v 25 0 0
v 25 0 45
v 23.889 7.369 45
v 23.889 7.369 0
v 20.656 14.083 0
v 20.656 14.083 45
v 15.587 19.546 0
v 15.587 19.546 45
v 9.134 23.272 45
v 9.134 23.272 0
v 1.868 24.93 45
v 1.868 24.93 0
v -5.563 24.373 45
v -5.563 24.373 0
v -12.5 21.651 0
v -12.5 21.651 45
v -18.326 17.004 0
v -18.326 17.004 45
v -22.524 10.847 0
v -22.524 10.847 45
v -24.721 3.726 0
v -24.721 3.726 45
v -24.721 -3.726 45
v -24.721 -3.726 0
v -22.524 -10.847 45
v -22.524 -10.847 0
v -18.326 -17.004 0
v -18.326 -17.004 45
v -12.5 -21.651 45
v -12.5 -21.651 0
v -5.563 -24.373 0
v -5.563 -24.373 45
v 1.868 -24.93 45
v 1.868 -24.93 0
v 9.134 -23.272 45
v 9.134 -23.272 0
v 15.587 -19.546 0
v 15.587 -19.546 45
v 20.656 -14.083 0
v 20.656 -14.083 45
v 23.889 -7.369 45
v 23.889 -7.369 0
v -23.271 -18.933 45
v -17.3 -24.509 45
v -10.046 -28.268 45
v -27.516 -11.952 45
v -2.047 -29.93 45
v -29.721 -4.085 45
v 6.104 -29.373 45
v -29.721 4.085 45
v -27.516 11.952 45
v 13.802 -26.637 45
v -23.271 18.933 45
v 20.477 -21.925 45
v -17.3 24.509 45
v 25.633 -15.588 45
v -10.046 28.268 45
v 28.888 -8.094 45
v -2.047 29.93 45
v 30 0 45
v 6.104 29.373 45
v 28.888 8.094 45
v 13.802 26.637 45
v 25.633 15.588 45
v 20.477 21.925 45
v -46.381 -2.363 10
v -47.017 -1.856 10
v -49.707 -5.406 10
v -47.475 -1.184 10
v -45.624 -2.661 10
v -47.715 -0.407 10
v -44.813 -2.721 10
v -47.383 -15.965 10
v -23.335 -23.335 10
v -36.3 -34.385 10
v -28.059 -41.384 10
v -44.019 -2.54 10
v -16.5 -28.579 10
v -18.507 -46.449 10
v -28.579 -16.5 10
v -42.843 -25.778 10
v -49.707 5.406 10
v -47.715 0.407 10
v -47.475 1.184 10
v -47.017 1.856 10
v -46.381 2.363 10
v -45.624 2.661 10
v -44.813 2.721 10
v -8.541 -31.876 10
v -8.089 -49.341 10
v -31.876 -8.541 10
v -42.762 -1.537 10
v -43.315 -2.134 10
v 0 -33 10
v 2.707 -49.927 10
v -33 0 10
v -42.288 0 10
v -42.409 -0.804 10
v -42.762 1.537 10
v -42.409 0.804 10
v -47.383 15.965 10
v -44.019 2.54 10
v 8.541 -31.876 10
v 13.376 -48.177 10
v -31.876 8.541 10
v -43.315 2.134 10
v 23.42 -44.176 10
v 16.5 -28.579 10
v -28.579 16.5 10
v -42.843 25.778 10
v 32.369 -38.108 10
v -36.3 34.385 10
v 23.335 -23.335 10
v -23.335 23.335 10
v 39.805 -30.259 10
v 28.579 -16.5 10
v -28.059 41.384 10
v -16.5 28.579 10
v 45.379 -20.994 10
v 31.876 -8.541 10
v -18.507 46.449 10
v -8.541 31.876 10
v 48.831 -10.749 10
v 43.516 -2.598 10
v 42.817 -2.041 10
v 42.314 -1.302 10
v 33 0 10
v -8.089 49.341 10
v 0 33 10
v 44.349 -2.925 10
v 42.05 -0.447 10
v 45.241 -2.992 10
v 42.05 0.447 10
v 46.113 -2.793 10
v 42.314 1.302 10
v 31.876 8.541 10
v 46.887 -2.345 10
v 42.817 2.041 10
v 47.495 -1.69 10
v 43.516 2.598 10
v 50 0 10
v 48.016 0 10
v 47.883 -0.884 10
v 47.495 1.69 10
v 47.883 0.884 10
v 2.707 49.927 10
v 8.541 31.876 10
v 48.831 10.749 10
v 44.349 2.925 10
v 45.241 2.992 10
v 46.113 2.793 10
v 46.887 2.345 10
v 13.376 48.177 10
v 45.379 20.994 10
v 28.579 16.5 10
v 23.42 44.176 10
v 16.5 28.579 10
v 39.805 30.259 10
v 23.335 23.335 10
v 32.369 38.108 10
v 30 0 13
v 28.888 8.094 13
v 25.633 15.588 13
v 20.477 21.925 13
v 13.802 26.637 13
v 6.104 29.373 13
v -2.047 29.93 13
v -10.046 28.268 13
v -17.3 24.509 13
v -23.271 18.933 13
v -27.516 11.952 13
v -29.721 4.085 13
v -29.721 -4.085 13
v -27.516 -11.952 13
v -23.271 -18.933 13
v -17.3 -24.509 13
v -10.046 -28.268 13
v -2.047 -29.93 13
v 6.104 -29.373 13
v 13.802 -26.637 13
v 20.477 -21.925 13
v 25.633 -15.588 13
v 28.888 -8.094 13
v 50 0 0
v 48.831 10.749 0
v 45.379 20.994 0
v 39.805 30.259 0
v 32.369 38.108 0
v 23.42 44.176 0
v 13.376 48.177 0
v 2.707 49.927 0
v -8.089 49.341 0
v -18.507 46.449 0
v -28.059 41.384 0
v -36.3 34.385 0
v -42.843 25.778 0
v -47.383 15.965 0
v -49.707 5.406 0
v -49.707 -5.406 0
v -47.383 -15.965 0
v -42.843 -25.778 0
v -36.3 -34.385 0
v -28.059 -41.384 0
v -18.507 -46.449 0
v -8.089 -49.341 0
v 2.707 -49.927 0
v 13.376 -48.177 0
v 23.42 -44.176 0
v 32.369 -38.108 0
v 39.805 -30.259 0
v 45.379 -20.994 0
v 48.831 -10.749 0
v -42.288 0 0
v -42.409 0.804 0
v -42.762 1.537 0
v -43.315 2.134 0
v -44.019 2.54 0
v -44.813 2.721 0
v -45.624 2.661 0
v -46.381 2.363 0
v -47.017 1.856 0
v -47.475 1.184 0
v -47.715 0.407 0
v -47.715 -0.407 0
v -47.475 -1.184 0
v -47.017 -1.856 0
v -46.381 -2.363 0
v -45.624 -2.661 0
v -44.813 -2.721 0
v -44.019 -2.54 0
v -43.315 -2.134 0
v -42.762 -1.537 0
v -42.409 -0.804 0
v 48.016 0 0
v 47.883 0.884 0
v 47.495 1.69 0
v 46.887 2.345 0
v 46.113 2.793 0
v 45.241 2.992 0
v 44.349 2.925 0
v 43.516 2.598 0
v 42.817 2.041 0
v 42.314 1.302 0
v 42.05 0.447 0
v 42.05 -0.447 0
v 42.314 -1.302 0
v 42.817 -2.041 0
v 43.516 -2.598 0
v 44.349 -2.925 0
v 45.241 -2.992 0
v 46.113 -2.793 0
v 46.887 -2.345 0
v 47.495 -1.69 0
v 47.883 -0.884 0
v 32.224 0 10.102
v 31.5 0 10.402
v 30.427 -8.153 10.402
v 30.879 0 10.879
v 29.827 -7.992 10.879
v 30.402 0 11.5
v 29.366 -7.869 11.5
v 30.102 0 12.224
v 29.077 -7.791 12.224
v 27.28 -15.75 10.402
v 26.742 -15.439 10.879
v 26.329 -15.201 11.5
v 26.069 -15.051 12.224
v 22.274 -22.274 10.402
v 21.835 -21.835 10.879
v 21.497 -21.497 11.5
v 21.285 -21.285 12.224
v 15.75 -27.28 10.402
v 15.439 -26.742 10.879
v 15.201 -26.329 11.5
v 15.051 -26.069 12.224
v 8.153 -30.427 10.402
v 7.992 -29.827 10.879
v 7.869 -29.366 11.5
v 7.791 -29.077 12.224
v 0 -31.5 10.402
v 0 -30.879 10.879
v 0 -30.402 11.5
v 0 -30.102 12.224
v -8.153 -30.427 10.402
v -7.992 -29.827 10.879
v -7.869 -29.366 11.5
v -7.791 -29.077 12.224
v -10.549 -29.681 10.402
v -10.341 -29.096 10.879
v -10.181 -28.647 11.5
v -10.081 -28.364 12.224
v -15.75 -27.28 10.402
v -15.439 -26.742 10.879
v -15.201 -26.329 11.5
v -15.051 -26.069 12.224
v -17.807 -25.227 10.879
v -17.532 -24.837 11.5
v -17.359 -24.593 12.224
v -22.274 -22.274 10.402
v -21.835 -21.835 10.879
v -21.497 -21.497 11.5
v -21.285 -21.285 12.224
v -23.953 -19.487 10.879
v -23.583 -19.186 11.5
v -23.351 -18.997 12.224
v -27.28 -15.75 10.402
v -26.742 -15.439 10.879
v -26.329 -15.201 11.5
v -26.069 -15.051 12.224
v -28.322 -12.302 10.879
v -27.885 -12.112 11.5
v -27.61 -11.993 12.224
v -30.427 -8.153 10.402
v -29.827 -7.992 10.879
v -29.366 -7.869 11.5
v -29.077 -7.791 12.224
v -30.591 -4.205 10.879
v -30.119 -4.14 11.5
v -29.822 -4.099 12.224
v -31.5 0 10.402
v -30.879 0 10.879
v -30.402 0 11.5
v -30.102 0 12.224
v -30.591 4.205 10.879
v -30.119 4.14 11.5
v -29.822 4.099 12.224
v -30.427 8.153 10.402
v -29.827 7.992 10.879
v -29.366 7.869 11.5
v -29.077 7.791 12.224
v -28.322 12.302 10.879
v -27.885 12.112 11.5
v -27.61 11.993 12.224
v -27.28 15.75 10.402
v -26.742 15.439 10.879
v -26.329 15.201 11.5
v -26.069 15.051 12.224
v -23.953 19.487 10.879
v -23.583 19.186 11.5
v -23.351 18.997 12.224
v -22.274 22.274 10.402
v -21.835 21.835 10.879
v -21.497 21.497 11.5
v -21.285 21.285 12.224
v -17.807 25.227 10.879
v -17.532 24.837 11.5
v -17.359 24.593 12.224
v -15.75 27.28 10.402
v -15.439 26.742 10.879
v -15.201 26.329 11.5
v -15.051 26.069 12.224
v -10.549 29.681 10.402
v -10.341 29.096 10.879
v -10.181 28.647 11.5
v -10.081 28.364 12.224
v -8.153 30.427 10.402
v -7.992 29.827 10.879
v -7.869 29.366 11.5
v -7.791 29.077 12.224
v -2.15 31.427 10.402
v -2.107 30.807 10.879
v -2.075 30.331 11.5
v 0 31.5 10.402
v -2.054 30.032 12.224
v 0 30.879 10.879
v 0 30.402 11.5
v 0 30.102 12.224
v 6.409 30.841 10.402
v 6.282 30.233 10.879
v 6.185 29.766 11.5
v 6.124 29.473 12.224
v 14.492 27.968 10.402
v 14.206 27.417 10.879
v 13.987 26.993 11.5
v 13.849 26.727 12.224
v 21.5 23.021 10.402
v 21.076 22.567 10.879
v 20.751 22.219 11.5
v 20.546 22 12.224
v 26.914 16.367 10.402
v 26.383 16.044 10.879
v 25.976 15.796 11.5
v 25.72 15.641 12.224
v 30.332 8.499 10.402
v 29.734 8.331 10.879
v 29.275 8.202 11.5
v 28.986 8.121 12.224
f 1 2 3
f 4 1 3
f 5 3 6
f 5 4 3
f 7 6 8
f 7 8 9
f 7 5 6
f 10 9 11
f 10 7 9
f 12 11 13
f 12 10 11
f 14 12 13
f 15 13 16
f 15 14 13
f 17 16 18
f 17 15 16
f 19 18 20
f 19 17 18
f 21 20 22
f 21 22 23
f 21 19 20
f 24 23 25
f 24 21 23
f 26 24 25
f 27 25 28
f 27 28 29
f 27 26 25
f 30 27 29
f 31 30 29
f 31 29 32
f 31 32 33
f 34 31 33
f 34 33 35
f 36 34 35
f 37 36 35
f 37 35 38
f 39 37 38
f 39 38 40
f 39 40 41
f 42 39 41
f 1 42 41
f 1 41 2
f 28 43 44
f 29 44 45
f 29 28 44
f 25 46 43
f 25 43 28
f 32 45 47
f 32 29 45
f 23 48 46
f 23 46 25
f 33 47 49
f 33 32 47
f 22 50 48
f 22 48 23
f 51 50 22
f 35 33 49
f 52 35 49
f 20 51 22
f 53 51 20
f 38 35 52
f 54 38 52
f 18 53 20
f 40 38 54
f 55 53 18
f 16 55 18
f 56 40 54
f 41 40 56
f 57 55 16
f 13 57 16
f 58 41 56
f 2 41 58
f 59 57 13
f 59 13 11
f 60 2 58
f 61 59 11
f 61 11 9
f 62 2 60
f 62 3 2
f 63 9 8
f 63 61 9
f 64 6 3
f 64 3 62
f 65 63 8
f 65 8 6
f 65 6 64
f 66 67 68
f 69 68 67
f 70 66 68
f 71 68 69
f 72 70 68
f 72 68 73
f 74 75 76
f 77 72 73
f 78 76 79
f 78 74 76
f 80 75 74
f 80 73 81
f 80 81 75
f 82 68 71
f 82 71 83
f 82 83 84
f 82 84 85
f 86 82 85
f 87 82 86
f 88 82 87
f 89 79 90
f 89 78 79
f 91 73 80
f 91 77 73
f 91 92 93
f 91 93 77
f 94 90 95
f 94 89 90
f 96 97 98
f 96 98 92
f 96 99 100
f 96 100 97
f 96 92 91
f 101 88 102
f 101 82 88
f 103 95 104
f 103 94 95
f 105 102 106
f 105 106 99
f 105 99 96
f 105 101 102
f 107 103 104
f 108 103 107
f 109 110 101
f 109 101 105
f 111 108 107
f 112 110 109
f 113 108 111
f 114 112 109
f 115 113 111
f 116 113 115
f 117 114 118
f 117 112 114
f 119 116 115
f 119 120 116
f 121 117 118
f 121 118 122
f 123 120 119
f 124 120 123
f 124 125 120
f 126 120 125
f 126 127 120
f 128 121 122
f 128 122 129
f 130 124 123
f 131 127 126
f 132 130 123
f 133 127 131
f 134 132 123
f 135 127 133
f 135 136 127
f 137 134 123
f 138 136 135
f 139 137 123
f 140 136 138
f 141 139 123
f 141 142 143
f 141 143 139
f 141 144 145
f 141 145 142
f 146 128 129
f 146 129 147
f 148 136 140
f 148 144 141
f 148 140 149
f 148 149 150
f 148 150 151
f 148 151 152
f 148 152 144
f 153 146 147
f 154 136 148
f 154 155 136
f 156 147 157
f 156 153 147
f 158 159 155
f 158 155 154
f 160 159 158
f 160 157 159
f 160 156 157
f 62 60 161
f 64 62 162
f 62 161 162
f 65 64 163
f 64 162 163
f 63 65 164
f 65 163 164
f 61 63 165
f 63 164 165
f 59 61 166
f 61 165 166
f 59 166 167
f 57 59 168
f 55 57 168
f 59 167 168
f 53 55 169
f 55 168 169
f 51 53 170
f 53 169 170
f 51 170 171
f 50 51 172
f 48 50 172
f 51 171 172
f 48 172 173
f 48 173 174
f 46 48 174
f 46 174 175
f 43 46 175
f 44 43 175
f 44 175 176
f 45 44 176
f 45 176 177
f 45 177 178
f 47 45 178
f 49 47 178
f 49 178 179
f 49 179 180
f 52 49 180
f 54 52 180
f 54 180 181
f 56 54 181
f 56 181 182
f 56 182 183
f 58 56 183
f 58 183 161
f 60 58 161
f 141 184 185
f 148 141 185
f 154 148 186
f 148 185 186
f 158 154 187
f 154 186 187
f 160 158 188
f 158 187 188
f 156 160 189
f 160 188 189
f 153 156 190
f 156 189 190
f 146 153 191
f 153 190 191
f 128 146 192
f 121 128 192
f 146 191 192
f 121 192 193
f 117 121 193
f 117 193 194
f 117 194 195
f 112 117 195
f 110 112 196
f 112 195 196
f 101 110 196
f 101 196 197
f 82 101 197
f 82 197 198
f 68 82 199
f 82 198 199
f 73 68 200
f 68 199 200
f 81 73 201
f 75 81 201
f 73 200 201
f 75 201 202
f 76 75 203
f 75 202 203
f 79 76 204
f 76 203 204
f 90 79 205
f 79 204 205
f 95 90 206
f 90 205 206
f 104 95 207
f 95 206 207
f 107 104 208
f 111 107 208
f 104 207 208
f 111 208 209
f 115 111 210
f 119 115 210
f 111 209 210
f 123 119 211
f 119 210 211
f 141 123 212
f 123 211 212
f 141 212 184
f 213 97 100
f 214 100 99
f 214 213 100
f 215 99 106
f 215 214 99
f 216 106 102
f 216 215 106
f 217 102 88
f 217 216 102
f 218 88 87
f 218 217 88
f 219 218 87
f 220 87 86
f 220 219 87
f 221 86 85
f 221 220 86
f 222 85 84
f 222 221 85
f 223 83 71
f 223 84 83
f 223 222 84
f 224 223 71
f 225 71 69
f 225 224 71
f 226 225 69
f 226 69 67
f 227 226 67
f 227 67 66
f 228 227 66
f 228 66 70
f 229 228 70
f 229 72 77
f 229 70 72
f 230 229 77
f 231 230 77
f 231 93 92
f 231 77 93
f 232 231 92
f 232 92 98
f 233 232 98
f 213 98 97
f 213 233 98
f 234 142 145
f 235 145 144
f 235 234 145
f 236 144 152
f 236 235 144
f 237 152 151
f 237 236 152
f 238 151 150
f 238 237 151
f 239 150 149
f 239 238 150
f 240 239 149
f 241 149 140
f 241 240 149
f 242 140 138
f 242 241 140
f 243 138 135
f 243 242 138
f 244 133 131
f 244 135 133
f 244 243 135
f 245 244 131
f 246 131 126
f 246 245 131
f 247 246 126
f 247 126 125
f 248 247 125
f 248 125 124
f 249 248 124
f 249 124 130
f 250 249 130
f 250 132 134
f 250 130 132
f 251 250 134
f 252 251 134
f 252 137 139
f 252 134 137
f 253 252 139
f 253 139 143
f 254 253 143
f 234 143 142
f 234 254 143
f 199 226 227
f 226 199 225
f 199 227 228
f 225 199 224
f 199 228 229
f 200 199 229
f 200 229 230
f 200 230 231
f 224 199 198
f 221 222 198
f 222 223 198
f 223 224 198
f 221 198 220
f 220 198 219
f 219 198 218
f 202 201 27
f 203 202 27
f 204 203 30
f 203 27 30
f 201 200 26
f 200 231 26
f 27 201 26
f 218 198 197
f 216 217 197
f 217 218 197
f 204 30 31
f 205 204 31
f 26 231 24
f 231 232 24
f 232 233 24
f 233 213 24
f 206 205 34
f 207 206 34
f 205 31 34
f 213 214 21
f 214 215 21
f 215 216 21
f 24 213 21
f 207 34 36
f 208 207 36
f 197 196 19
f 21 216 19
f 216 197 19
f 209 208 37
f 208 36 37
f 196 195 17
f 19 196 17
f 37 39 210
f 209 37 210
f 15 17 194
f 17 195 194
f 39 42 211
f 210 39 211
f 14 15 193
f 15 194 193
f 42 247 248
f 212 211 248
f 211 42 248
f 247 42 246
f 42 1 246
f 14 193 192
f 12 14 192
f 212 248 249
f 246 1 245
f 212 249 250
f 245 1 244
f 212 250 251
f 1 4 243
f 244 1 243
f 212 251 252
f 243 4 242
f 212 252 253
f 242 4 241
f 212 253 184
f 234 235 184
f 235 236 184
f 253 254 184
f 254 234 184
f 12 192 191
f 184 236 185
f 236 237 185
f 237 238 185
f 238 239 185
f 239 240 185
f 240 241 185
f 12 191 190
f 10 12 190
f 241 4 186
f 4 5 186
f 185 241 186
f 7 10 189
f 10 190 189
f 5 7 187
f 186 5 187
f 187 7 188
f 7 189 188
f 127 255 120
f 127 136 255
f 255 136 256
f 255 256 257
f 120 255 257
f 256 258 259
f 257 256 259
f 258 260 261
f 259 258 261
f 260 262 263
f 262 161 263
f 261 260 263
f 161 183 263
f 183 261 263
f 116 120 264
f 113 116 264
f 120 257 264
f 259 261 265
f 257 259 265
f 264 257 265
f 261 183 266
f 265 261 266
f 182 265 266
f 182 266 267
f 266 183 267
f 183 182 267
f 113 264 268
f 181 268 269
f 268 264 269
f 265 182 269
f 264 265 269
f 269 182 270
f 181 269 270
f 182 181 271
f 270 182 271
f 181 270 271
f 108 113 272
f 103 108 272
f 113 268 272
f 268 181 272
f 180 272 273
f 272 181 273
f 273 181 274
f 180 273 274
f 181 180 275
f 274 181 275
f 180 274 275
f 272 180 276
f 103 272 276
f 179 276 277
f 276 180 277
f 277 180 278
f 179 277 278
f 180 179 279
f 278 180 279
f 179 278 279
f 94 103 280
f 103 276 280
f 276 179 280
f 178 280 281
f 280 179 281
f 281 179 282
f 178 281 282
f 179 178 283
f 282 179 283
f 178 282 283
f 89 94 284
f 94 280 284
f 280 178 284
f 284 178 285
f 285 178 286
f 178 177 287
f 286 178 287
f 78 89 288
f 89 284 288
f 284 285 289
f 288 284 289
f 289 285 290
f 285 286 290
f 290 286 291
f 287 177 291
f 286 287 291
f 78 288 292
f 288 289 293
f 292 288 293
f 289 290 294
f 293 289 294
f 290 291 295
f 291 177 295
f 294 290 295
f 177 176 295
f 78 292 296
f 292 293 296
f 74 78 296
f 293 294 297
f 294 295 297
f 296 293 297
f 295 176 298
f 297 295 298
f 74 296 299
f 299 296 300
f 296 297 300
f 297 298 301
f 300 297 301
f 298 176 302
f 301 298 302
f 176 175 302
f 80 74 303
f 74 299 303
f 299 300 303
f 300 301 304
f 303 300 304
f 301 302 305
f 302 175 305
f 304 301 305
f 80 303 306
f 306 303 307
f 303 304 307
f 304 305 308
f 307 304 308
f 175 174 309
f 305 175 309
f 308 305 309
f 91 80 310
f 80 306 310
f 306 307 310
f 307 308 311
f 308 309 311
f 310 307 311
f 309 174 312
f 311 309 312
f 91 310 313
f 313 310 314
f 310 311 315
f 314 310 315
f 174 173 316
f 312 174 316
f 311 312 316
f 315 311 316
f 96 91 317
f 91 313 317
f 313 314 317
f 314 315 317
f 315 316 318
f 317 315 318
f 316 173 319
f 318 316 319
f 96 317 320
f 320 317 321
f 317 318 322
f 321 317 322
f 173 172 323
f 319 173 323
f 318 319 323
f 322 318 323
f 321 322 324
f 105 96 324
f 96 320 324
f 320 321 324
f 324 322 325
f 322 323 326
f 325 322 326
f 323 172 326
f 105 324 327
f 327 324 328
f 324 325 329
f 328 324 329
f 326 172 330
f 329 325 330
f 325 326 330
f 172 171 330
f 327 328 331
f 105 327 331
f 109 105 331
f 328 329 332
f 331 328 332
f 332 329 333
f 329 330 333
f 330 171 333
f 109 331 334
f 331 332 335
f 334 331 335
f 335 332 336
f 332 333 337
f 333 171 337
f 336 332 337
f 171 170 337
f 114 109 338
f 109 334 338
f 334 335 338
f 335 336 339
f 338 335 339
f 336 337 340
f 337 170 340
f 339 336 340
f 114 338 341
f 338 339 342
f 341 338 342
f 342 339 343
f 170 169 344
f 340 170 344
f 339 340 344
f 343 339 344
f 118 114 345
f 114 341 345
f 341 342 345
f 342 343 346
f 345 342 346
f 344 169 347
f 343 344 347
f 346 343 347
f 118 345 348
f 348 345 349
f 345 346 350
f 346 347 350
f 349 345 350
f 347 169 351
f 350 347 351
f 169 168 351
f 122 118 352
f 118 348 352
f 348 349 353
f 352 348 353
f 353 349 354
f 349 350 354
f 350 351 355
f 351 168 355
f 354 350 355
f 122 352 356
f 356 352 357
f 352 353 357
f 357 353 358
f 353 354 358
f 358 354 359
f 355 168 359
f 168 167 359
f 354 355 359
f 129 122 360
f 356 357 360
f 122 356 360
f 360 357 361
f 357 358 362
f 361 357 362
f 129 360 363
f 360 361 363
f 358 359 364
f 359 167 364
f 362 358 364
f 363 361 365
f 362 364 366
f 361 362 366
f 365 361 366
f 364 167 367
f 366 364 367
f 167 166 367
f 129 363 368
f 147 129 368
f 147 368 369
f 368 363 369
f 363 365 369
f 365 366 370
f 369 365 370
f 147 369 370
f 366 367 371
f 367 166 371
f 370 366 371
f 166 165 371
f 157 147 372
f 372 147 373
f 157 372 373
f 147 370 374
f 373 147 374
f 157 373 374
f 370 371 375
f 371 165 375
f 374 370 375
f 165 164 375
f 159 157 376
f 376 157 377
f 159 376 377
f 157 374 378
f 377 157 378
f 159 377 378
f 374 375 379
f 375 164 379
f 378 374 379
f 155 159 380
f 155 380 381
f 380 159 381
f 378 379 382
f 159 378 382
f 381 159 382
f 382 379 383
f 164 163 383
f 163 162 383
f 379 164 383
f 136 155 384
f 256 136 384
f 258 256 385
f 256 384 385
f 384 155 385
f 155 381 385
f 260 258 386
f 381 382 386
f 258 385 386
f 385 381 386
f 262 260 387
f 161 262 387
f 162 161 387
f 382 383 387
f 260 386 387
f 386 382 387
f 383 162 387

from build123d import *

# Parameters (mm, degrees)
SKETCH1_R           = 50
SKETCH1_R_2         = 25
BOSS_EXTRUDE1_DEPTH = 10
SKETCH2_R           = 30
SKETCH2_R_2         = 25
BOSS_EXTRUDE2_DEPTH = 45
FILLET1_R           = 3
SKETCH3_R           = 3
SKETCH3_R_2         = 2.728941423
CUT_EXTRUDE1_DEPTH  = 50


with BuildPart() as part:
    # Sketch1 → Boss-Extrude1 (new body)
    with BuildSketch(Plane.XY):
        Circle(SKETCH1_R)
        Circle(SKETCH1_R_2, mode=Mode.SUBTRACT)
    extrude(amount=BOSS_EXTRUDE1_DEPTH)

    # Sketch2 → Boss-Extrude2 (add)
    with BuildSketch(Plane.XY):
        Circle(SKETCH2_R)
        Circle(SKETCH2_R_2, mode=Mode.SUBTRACT)
    extrude(amount=BOSS_EXTRUDE2_DEPTH)

    # Fillet1
    fillet1_edges = [part.edges().sort_by_distance(p)[0] for p in [
        (-30, 0, 10),
    ]]
    fillet(fillet1_edges, radius=FILLET1_R)

    # Sketch3 → Cut-Extrude1 (cut)
    with BuildSketch(Plane.XY):
        with Locations((45.016491683, 0)):
            Circle(SKETCH3_R)
        with Locations((-45.016491683, 0)):
            Circle(SKETCH3_R_2)
    extrude(amount=CUT_EXTRUDE1_DEPTH, mode=Mode.SUBTRACT)


solid = part.part
